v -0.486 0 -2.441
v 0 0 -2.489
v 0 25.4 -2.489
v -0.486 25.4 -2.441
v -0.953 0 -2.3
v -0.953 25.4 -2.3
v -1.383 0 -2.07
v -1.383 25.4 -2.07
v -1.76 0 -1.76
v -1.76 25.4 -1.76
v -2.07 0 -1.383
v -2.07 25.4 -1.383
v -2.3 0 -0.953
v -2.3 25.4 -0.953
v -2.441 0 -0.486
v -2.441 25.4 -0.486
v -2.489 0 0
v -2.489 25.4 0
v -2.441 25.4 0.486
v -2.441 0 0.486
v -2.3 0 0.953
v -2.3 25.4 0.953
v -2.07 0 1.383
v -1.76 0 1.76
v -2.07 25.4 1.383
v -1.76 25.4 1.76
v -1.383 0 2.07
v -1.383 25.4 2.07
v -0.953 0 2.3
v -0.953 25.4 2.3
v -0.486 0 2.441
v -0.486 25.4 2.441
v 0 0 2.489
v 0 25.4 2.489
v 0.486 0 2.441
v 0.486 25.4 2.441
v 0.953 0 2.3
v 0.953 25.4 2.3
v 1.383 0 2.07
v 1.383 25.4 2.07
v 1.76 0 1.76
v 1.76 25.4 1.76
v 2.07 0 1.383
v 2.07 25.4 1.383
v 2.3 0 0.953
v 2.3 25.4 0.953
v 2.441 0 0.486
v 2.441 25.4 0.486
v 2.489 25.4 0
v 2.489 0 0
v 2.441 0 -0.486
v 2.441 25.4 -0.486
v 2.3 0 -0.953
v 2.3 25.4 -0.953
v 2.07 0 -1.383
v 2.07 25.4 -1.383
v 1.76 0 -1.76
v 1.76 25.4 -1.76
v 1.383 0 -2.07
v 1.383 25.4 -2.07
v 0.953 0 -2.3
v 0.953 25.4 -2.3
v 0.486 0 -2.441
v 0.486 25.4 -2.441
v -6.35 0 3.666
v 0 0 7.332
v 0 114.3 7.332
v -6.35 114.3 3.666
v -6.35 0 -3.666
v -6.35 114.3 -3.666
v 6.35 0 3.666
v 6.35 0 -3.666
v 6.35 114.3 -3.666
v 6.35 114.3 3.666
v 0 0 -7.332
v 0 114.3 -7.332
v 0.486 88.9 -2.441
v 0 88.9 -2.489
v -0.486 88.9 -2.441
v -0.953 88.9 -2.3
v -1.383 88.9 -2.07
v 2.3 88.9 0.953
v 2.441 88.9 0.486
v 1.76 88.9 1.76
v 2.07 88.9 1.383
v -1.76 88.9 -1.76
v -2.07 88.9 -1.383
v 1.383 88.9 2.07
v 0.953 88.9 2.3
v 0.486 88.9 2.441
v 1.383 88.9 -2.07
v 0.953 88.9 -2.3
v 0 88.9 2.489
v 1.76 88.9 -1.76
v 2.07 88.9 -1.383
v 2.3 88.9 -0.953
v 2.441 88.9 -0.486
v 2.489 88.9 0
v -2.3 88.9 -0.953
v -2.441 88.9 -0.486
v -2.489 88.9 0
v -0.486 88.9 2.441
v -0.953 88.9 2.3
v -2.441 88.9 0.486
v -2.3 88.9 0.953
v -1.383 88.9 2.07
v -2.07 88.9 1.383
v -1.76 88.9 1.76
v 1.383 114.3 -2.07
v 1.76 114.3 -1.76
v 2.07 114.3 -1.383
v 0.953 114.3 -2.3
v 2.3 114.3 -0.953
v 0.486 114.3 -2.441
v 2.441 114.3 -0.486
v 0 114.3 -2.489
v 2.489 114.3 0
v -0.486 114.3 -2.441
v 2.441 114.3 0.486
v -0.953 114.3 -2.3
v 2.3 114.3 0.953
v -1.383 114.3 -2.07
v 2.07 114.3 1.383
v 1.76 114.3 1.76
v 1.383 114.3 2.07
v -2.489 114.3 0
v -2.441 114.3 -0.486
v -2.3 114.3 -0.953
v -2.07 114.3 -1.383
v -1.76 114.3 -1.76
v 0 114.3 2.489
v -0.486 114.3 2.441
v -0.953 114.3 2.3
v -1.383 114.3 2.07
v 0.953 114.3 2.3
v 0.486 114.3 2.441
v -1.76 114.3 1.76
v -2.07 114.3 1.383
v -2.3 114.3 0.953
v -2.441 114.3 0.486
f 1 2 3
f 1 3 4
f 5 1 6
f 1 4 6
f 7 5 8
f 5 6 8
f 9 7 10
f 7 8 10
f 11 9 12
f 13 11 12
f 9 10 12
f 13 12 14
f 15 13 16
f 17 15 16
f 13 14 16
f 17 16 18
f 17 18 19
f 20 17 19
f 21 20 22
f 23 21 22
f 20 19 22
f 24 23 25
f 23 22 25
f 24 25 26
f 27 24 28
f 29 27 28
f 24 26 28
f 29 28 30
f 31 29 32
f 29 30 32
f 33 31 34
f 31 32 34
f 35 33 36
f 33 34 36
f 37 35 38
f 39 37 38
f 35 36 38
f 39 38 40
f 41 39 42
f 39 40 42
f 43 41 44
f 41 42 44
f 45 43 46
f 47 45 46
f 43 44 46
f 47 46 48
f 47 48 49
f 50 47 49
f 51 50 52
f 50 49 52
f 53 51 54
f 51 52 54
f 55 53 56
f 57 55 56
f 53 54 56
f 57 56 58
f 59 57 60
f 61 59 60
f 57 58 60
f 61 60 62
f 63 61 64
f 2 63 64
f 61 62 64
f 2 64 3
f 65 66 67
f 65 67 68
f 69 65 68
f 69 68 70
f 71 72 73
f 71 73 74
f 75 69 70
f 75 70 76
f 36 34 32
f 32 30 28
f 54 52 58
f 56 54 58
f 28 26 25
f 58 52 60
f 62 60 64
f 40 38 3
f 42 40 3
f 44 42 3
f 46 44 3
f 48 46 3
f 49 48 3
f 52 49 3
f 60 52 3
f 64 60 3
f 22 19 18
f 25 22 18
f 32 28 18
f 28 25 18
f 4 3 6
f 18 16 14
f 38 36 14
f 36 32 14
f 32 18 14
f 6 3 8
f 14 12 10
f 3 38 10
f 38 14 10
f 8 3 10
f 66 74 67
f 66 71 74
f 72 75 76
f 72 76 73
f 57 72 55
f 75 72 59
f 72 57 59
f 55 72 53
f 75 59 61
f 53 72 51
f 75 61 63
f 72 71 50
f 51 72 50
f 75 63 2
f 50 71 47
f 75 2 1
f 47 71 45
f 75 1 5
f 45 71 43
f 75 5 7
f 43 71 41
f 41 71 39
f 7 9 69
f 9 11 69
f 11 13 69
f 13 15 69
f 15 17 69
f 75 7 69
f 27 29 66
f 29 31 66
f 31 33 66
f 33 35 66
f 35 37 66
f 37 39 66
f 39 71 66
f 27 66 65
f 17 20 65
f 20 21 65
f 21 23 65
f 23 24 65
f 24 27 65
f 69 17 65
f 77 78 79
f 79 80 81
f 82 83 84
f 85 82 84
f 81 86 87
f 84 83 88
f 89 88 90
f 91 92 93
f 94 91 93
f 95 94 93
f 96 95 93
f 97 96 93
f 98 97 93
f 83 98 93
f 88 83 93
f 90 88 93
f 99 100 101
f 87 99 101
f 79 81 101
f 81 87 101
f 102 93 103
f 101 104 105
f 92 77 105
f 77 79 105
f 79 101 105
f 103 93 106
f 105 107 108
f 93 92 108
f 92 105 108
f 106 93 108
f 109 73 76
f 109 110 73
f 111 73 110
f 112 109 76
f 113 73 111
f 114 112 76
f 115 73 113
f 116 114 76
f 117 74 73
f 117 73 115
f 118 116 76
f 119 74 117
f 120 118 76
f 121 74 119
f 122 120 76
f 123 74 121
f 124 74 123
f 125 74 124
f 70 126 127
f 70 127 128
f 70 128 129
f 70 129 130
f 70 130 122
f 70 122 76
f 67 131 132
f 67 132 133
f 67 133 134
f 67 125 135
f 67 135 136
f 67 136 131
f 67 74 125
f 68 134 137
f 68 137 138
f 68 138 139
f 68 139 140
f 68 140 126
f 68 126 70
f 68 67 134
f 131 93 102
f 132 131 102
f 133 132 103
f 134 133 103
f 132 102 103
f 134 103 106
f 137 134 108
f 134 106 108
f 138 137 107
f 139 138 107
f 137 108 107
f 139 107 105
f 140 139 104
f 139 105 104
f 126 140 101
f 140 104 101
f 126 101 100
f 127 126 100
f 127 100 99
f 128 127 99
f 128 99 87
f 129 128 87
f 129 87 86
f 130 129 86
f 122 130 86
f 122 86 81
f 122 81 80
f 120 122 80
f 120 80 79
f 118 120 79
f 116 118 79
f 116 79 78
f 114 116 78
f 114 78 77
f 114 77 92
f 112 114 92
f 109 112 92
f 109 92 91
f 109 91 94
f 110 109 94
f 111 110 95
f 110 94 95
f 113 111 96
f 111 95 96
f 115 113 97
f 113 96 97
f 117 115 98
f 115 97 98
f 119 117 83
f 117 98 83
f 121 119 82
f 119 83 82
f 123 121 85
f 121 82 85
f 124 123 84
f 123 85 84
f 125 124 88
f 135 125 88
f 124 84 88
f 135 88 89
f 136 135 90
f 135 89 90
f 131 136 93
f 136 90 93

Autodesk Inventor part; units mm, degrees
ref_plane "YZ Plane" through (0, 0, 0) normal (1, 0, 0) x (0, 1, 0)
ref_plane "XZ Plane" through (0, 0, 0) normal (0, 1, 0) x (-1, 0, 0)
ref_plane "XY Plane" through (0, 0, 0) normal (0, 0, 1) x (1, 0, 0)
sketch "Sketch1" plane through (0, 0, 0) normal (0, 1, 0) x (-1, 0, 0)
  line L0 (6.35, -3.6662) -> (0, -7.3323)
  line L1 (0, -7.3323) -> (-6.35, -3.6662)
  line L2 (-6.35, -3.6662) -> (-6.35, 3.6662)
  line L3 (-6.35, 3.6662) -> (0, 7.3323)
  line L4 (0, 7.3323) -> (6.35, 3.6662)
  line L5 (6.35, 3.6662) -> (6.35, -3.6662)
  point P0 (0, 0)
  point P1 (0, 0)
  point P2 (0, 0)
  dimension "d0" = 12.7
extrude "Extrusion1" add sketch "Sketch1" along normal blind 114.3
sketch "Sketch2" plane through (0, 0, 0) normal (0, -1, 0) x (1, 0, 0)
  point P0 (0, 0)
  point P1 (0, 0)
hole "Hole1" at (0, 0, 0) direction (0, 1, 0) diameter 4.9784 depth 25.4 thread size "1/4-20 UNC" class "2B" standard "ANSI Unified Screw Threads"
sketch "Sketch3" plane through (0, 114.3, 0) normal (0, 1, 0) x (1, 0, 0)
  point P0 (0, 0)
  point P1 (0, 0)
hole "Hole2" at (0, 114.3, 0) direction (0, -1, 0) diameter 4.9784 depth 25.4 thread size "1/4-20 UNC" class "2B" standard "ANSI Unified Screw Threads"
properties part number "SHOT_1_003_Hexshaft1" material "Aluminum 6061"
